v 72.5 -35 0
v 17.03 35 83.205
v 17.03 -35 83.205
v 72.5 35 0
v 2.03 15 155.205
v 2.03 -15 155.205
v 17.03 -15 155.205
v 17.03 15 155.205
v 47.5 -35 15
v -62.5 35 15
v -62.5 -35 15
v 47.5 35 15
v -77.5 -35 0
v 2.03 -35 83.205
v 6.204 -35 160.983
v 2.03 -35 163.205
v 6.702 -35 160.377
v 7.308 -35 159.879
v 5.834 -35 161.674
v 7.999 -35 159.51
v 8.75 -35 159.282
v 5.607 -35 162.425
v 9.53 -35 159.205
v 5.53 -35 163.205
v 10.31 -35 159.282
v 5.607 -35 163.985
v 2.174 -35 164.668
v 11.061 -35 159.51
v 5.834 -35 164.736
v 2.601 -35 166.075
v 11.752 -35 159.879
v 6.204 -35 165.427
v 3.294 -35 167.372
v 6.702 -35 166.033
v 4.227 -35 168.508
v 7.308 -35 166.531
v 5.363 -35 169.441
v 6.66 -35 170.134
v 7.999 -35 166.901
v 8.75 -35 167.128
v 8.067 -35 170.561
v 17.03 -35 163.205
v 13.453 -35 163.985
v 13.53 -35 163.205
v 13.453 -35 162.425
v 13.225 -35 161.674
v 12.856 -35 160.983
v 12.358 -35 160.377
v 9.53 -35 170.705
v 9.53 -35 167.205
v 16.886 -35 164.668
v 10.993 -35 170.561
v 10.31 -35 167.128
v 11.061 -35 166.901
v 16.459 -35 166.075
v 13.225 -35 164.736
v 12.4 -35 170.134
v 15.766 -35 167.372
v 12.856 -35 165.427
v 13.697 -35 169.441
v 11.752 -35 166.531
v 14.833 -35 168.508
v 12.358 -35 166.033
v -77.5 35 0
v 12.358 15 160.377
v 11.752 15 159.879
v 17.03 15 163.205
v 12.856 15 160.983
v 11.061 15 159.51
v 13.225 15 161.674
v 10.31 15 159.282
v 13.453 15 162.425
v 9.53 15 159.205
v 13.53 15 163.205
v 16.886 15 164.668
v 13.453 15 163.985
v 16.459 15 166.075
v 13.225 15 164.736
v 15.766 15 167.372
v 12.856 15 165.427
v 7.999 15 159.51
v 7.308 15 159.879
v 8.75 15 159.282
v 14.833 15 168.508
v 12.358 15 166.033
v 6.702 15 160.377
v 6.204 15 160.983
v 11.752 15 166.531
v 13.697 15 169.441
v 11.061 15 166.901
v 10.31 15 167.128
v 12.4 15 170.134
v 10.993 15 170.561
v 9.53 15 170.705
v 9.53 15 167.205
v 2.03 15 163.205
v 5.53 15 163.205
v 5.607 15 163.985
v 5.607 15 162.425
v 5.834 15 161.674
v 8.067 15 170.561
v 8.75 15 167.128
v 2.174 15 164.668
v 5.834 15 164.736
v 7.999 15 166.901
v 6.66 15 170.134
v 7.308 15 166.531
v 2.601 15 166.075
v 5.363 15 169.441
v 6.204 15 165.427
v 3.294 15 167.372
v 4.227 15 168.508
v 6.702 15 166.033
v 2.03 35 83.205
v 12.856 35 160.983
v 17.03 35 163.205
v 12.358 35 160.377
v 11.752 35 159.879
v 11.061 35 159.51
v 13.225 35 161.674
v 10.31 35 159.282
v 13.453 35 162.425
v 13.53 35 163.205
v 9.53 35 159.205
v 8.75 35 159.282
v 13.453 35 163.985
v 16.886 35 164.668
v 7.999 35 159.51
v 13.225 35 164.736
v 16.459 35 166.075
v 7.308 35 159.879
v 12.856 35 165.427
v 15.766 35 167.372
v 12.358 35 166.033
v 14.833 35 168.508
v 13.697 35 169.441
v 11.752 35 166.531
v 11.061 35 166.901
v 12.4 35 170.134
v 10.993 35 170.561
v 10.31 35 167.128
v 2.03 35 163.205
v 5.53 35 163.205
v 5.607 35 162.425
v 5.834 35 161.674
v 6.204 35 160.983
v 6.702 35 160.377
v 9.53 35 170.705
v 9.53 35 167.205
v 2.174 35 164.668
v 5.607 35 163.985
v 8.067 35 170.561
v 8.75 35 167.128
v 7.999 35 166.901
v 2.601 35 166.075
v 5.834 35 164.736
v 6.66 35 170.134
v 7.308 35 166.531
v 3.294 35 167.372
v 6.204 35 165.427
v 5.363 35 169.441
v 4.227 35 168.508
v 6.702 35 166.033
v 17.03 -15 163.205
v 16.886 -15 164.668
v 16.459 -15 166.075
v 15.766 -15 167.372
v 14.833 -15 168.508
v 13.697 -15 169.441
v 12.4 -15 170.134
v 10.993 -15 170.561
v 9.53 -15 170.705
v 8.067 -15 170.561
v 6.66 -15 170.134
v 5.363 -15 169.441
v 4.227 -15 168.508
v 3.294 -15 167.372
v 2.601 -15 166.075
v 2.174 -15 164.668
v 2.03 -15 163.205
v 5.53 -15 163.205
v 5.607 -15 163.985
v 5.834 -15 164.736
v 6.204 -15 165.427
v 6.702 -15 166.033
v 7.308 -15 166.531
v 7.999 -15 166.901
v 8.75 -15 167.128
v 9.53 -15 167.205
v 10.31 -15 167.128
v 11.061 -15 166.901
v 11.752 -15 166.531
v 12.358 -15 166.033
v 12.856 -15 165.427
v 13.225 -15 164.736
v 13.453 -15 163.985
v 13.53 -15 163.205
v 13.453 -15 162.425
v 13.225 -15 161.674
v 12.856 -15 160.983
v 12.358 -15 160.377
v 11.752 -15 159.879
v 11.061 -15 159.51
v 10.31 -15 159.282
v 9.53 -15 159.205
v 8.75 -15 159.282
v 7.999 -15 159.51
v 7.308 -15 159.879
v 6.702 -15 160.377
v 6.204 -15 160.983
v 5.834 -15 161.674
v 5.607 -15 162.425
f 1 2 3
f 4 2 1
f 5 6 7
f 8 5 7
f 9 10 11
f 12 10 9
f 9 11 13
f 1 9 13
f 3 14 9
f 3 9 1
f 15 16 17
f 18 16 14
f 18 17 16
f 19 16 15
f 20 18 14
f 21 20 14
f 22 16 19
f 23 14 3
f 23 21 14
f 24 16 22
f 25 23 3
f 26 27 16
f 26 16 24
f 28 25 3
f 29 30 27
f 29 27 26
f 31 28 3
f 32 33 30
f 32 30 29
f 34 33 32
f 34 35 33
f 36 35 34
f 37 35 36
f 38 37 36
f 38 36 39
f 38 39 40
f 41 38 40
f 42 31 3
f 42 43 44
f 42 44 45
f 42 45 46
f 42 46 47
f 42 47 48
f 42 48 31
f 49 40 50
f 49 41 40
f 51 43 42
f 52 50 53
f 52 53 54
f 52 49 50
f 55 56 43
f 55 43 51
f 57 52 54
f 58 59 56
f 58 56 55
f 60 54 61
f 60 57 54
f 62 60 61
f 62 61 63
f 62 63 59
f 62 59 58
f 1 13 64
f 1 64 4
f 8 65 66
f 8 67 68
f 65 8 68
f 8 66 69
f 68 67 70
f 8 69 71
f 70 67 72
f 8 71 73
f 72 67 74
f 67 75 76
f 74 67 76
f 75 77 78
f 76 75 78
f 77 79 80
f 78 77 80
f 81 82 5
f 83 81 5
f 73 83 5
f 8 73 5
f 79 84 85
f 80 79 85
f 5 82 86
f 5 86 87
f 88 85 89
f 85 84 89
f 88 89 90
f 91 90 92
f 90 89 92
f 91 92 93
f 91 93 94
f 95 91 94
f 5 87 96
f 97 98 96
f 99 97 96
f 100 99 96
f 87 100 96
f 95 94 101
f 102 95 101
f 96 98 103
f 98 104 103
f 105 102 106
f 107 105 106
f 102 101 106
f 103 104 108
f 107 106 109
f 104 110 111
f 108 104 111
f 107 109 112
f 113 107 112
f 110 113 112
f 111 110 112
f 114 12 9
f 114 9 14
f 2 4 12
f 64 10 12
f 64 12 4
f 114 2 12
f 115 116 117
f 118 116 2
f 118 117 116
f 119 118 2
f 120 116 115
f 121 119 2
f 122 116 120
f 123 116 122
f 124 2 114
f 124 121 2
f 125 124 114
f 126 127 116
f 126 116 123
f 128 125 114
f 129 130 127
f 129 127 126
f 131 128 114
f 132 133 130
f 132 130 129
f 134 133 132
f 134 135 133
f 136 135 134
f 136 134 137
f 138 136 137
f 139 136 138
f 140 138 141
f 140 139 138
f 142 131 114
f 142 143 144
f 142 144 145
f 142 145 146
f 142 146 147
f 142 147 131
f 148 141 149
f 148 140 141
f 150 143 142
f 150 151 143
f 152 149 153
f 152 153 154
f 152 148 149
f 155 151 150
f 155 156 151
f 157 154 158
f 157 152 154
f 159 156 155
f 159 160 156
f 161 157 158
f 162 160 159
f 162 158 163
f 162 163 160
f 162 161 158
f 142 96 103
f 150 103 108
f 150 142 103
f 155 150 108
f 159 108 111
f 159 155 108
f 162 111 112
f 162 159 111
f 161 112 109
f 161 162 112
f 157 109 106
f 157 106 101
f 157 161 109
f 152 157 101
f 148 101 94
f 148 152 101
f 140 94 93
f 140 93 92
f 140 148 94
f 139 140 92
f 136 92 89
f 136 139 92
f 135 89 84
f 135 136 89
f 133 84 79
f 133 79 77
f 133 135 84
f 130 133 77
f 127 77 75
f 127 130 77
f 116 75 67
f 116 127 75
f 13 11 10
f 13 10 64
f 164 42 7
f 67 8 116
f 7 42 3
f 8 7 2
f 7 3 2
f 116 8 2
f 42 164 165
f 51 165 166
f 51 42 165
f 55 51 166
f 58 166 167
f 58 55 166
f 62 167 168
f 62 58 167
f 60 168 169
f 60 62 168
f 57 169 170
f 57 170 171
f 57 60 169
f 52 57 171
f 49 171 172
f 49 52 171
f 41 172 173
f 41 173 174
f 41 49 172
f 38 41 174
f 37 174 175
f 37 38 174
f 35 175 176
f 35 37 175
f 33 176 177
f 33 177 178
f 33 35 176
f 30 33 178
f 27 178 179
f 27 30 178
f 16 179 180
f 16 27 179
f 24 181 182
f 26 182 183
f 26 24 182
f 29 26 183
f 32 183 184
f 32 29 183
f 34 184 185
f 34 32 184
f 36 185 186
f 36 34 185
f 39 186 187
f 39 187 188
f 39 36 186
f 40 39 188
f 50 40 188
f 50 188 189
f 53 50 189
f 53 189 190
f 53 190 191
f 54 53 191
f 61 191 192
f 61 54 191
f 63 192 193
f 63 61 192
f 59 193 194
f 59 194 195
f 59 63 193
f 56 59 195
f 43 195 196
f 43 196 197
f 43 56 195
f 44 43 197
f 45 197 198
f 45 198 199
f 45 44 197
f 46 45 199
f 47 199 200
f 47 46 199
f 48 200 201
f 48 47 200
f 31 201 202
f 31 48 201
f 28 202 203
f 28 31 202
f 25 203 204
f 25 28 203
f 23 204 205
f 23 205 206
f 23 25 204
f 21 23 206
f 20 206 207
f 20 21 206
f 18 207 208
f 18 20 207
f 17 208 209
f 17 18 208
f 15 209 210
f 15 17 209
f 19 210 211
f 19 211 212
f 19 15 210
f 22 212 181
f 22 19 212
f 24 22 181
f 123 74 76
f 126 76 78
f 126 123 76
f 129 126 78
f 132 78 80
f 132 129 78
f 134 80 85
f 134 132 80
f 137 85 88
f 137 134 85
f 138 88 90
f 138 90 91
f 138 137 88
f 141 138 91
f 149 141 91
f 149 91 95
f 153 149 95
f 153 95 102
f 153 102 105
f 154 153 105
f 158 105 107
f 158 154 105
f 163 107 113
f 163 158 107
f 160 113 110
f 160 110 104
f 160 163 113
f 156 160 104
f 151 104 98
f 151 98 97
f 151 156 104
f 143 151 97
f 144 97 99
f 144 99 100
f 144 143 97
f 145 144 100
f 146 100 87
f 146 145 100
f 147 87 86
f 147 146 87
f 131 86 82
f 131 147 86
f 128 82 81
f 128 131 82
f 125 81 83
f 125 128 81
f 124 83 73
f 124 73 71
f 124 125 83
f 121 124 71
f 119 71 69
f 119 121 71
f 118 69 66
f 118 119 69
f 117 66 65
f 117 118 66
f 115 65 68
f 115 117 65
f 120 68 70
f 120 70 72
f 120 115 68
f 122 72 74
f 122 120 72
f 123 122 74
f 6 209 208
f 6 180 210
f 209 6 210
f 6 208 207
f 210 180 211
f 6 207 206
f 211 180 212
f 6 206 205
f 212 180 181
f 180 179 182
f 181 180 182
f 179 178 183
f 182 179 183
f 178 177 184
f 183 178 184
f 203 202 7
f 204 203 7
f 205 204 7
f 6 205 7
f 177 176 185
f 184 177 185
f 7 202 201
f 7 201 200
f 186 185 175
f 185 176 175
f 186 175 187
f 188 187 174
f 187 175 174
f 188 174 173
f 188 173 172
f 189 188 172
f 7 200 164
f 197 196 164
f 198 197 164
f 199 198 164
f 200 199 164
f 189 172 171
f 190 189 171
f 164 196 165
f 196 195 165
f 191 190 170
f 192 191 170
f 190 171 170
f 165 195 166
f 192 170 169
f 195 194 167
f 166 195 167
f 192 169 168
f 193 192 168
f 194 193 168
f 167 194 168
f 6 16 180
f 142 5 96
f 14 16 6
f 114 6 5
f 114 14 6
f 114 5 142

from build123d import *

# Parameters (mm, degrees)
F0_W      = 125
F0_H      = 70
F1_DEPTH  = 15
F3_DEPTH  = 70
F5_DEPTH  = 70
F7_DEPTH  = 70
F9_DEPTH  = 20
F11_DEPTH = 20
F12_W     = 15
F12_H     = 30
F13_DEPTH = 72


with BuildPart() as f1:
    # F0 (on Top) → F1 (new body)
    with BuildSketch(Plane.XY):
        Rectangle(F0_W, F0_H)
    extrude(amount=F1_DEPTH)

    # F2 (on face) → F3 (join)
    with BuildSketch(Plane.XZ.offset(35)):
        Polygon((62.5, 15), (62.5, 0), (72.5, 0), align=None)
    extrude(amount=-F3_DEPTH)

    # F4 (on face) → F5 (join)
    with BuildSketch(Plane.XZ.offset(35)):
        Polygon((-77.5, 0), (-62.5, 0), (-62.5, 15), align=None)
    extrude(amount=-F5_DEPTH)

    # F6 (on face) → F7 (join)
    with BuildSketch(Plane(origin=(0, 35, 0), x_dir=(-1, 0, 0), z_dir=(0, 1, 0))):
        Polygon((-17.0299803775, 83.2050294338), (-62.5, 15), (-47.5, 15), (-2.0299803775, 83.2050294338), align=None)
    extrude(amount=-F7_DEPTH)

    # F8 (on face) → F9 (join)
    with BuildSketch(Plane.XZ.offset(35)):
        with BuildLine():
            Line((2.0299803775, 163.2050294338), (2.0299803775, 83.2050294338))
            Line((2.0299803775, 83.2050294338), (17.0299803775, 83.2050294338))
            Line((17.0299803775, 83.2050294338), (17.0299803775, 163.2050294338))
            ThreePointArc((17.0299803775, 163.2050294338), (9.5299803775, 155.7050294338), (2.0299803775, 163.2050294338))
        make_face()
        with BuildLine():
            ThreePointArc((17.0299803775, 163.2050294338), (9.5299803775, 170.7050294338), (2.0299803775, 163.2050294338))
            Line((2.0299803775, 163.2050294338), (5.5299803775, 163.2050294338))
            ThreePointArc((5.5299803775, 163.2050294338), (9.5299803775, 167.2050294338), (13.5299803775, 163.2050294338))
            Line((13.5299803775, 163.2050294338), (17.0299803775, 163.2050294338))
        make_face()
        with BuildLine():
            Line((5.5299803775, 163.2050294338), (2.0299803775, 163.2050294338))
            ThreePointArc((2.0299803775, 163.2050294338), (9.5299803775, 155.7050294338), (17.0299803775, 163.2050294338))
            Line((17.0299803775, 163.2050294338), (13.5299803775, 163.2050294338))
            ThreePointArc((13.5299803775, 163.2050294338), (9.5299803775, 159.2050294338), (5.5299803775, 163.2050294338))
        make_face()
    extrude(amount=-F9_DEPTH)

    # F10 (on face) → F11 (join)
    with BuildSketch(Plane(origin=(0, 35, 0), x_dir=(-1, 0, 0), z_dir=(0, 1, 0))):
        with BuildLine():
            Line((-17.0299803775, 163.2050294338), (-17.0299803775, 83.2050294338))
            Line((-17.0299803775, 83.2050294338), (-2.0299803775, 83.2050294338))
            Line((-2.0299803775, 83.2050294338), (-2.0299803775, 163.2050294338))
            ThreePointArc((-2.0299803775, 163.2050294338), (-9.5299803775, 155.7050294338), (-17.0299803775, 163.2050294338))
        make_face()
        with BuildLine():
            ThreePointArc((-2.0299803775, 163.2050294338), (-9.5299803775, 170.7050294338), (-17.0299803775, 163.2050294338))
            Line((-17.0299803775, 163.2050294338), (-13.5299803775, 163.2050294338))
            ThreePointArc((-13.5299803775, 163.2050294338), (-9.5299803775, 167.2050294338), (-5.5299803775, 163.2050294338))
            Line((-5.5299803775, 163.2050294338), (-2.0299803775, 163.2050294338))
        make_face()
        with BuildLine():
            Line((-13.5299803775, 163.2050294338), (-17.0299803775, 163.2050294338))
            ThreePointArc((-17.0299803775, 163.2050294338), (-9.5299803775, 155.7050294338), (-2.0299803775, 163.2050294338))
            Line((-2.0299803775, 163.2050294338), (-5.5299803775, 163.2050294338))
            ThreePointArc((-5.5299803775, 163.2050294338), (-9.5299803775, 159.2050294338), (-13.5299803775, 163.2050294338))
        make_face()
    extrude(amount=-F11_DEPTH)

    # F12 (on face) → F13 (join)
    with BuildSketch(Plane.XY.offset(83.2050294338)):
        with Locations((9.5299803775, 0)):
            Rectangle(F12_W, F12_H)
    extrude(amount=F13_DEPTH)


solid = f1.part
